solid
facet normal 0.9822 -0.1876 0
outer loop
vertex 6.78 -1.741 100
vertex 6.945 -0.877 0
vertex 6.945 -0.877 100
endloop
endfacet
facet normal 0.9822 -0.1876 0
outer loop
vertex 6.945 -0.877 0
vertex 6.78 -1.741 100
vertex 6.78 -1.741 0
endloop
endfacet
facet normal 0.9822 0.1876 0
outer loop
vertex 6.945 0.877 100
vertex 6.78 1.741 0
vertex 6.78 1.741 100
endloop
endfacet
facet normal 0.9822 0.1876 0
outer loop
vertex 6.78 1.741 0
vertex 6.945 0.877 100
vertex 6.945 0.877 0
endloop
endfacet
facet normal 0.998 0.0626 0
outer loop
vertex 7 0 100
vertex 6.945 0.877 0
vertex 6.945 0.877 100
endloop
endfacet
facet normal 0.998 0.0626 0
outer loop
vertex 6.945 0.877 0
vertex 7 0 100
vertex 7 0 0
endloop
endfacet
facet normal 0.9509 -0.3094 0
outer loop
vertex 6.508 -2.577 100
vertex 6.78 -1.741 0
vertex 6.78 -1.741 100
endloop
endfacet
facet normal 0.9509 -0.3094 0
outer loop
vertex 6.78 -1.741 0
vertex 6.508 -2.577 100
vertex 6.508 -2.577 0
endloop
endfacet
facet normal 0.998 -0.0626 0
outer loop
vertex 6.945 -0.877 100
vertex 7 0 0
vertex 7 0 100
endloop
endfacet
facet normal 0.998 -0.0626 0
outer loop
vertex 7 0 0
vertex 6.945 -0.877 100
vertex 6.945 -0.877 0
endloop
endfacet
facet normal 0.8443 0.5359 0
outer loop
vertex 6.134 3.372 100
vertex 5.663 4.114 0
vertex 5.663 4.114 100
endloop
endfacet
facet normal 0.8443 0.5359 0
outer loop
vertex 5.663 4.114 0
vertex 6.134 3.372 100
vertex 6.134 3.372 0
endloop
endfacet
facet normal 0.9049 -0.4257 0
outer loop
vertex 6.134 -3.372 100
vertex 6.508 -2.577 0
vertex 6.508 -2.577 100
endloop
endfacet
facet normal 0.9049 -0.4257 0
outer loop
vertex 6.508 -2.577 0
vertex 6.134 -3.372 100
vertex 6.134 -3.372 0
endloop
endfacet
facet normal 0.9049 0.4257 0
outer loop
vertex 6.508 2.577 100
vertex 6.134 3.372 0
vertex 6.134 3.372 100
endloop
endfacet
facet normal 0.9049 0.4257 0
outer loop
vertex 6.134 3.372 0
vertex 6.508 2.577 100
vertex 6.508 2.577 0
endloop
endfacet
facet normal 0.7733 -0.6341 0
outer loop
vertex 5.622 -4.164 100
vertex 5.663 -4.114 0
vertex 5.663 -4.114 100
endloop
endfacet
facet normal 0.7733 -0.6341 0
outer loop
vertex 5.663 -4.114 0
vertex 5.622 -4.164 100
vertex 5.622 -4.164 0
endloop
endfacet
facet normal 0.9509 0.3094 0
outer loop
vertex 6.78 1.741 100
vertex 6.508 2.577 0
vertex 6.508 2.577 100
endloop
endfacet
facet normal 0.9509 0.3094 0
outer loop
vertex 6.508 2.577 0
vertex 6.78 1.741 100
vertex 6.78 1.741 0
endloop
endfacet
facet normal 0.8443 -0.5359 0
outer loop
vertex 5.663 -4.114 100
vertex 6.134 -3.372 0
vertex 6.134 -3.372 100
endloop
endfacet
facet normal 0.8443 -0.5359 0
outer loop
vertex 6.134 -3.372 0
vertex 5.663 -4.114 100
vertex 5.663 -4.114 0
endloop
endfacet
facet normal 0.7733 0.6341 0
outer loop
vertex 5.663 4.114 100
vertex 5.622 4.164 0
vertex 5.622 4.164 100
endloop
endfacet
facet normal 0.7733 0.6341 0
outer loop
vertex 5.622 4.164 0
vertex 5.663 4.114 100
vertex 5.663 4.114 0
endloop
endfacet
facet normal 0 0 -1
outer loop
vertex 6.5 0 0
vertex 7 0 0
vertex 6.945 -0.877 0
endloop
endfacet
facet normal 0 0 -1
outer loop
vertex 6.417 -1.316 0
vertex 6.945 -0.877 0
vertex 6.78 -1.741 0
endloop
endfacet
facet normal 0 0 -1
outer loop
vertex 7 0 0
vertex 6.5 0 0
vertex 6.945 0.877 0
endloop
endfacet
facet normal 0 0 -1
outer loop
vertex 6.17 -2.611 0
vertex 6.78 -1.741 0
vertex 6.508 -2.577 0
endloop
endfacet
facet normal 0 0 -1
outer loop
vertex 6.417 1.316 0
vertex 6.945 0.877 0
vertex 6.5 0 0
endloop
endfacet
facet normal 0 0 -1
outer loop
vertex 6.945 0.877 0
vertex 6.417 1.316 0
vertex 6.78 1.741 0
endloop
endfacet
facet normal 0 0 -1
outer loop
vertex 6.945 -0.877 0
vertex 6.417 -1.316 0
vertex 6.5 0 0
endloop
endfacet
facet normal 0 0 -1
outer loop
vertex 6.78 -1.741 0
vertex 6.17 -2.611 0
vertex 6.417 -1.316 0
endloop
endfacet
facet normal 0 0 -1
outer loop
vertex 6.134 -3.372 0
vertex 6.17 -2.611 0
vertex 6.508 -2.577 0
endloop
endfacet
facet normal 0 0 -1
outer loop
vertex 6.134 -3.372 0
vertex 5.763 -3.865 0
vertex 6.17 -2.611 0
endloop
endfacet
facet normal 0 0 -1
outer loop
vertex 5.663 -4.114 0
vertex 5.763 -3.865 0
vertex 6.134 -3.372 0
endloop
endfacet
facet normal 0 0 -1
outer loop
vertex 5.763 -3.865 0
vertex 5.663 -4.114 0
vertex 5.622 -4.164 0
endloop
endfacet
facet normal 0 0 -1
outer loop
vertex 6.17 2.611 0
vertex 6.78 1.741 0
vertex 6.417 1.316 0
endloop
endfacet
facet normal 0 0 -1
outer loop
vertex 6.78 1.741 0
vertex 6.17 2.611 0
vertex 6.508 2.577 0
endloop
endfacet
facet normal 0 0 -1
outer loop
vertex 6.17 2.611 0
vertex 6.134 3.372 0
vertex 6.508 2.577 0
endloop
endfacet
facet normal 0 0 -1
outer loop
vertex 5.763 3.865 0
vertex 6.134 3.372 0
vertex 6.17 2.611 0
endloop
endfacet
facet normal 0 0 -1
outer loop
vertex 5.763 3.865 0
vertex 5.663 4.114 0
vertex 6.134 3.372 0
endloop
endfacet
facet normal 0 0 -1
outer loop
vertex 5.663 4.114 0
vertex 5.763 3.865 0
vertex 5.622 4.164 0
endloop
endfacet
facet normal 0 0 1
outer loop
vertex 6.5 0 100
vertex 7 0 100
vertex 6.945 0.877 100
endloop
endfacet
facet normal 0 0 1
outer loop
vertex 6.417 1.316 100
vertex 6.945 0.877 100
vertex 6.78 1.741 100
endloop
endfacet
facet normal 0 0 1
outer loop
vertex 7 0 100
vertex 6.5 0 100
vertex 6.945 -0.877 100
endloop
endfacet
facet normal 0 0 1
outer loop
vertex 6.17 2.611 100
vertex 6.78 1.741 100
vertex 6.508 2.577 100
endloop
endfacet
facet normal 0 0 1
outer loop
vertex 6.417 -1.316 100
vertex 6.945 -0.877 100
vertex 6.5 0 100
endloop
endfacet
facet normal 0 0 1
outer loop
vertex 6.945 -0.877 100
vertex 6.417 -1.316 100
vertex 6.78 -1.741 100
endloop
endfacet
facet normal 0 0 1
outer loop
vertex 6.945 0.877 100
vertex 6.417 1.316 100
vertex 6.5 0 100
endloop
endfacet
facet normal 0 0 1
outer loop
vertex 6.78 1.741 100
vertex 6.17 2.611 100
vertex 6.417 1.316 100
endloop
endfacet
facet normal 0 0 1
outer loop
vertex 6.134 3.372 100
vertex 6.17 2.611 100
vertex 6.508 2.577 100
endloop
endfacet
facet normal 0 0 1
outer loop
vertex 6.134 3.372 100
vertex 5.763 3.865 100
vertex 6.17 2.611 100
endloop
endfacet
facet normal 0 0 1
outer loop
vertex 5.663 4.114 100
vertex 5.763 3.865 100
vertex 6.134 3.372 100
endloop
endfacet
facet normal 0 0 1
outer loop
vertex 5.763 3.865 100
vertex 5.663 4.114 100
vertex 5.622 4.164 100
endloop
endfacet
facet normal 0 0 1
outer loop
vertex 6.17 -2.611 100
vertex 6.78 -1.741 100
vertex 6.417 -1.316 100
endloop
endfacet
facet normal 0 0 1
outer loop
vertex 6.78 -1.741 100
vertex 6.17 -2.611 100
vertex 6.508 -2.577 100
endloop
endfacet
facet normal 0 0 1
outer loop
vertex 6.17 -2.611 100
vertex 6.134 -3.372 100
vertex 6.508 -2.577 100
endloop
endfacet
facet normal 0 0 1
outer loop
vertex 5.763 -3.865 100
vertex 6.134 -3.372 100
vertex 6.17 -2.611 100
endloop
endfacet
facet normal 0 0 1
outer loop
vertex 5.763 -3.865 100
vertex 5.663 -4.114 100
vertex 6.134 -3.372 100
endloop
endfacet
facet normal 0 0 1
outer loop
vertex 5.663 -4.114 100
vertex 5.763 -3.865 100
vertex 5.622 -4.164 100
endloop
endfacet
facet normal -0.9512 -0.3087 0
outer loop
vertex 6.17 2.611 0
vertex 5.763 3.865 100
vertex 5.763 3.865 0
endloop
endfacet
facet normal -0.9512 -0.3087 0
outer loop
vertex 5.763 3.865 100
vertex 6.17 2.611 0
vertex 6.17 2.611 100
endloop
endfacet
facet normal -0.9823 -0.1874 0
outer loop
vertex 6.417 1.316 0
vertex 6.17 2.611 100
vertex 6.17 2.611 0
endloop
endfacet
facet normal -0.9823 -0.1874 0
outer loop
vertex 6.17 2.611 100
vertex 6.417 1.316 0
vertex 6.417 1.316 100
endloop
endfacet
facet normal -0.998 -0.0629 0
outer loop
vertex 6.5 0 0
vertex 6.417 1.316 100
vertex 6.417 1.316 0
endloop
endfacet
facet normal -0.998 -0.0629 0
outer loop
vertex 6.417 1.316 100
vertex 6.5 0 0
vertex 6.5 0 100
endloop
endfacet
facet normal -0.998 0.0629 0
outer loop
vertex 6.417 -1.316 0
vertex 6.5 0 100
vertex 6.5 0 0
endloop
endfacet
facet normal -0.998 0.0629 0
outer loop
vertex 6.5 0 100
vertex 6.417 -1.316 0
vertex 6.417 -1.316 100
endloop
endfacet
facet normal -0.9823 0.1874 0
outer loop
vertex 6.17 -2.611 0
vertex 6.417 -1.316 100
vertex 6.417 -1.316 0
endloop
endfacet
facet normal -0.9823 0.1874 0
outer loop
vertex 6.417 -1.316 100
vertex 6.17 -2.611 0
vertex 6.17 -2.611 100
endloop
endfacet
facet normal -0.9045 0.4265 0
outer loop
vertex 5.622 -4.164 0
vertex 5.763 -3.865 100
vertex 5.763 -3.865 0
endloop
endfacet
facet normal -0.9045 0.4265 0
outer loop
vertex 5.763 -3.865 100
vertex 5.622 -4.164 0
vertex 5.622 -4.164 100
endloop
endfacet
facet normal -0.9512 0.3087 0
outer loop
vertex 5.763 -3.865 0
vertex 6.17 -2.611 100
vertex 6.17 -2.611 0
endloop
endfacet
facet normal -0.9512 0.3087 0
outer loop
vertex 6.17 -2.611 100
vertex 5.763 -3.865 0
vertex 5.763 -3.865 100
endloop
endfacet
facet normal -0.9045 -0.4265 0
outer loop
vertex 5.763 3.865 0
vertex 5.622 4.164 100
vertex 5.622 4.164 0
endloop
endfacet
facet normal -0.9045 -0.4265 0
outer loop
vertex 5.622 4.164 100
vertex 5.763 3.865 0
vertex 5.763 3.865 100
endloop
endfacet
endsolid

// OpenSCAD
$fn = 50;


difference() {
	union() {
		cylinder(h = 100, r = 7.0000000000);
		translate(v = [-7.0000000000, 0, 0]) {
			cylinder(h = 100, r = 7.0000000000);
		}
	}
	union() {
		cylinder(h = 100, r = 3.2500000000);
		cylinder(h = 100, r = 1.8000000000);
		cylinder(h = 100, r = 1.8000000000);
		cylinder(h = 100, r = 1.8000000000);
		translate(v = [-11.5000000000, 0, 0]) {
			hull() {
				translate(v = [-3.7500000000, 0.0000000000, 0]) {
					cylinder(h = 100, r = 10.5000000000);
				}
				translate(v = [3.7500000000, 0.0000000000, 0]) {
					cylinder(h = 100, r = 10.5000000000);
				}
				translate(v = [-3.7500000000, -0.0000000000, 0]) {
					cylinder(h = 100, r = 10.5000000000);
				}
				translate(v = [3.7500000000, -0.0000000000, 0]) {
					cylinder(h = 100, r = 10.5000000000);
				}
			}
		}
		translate(v = [-4.0000000000, 0, 0.0000000000]) {
			cylinder(h = 100, r = 10.5000000000);
		}
	}
}
